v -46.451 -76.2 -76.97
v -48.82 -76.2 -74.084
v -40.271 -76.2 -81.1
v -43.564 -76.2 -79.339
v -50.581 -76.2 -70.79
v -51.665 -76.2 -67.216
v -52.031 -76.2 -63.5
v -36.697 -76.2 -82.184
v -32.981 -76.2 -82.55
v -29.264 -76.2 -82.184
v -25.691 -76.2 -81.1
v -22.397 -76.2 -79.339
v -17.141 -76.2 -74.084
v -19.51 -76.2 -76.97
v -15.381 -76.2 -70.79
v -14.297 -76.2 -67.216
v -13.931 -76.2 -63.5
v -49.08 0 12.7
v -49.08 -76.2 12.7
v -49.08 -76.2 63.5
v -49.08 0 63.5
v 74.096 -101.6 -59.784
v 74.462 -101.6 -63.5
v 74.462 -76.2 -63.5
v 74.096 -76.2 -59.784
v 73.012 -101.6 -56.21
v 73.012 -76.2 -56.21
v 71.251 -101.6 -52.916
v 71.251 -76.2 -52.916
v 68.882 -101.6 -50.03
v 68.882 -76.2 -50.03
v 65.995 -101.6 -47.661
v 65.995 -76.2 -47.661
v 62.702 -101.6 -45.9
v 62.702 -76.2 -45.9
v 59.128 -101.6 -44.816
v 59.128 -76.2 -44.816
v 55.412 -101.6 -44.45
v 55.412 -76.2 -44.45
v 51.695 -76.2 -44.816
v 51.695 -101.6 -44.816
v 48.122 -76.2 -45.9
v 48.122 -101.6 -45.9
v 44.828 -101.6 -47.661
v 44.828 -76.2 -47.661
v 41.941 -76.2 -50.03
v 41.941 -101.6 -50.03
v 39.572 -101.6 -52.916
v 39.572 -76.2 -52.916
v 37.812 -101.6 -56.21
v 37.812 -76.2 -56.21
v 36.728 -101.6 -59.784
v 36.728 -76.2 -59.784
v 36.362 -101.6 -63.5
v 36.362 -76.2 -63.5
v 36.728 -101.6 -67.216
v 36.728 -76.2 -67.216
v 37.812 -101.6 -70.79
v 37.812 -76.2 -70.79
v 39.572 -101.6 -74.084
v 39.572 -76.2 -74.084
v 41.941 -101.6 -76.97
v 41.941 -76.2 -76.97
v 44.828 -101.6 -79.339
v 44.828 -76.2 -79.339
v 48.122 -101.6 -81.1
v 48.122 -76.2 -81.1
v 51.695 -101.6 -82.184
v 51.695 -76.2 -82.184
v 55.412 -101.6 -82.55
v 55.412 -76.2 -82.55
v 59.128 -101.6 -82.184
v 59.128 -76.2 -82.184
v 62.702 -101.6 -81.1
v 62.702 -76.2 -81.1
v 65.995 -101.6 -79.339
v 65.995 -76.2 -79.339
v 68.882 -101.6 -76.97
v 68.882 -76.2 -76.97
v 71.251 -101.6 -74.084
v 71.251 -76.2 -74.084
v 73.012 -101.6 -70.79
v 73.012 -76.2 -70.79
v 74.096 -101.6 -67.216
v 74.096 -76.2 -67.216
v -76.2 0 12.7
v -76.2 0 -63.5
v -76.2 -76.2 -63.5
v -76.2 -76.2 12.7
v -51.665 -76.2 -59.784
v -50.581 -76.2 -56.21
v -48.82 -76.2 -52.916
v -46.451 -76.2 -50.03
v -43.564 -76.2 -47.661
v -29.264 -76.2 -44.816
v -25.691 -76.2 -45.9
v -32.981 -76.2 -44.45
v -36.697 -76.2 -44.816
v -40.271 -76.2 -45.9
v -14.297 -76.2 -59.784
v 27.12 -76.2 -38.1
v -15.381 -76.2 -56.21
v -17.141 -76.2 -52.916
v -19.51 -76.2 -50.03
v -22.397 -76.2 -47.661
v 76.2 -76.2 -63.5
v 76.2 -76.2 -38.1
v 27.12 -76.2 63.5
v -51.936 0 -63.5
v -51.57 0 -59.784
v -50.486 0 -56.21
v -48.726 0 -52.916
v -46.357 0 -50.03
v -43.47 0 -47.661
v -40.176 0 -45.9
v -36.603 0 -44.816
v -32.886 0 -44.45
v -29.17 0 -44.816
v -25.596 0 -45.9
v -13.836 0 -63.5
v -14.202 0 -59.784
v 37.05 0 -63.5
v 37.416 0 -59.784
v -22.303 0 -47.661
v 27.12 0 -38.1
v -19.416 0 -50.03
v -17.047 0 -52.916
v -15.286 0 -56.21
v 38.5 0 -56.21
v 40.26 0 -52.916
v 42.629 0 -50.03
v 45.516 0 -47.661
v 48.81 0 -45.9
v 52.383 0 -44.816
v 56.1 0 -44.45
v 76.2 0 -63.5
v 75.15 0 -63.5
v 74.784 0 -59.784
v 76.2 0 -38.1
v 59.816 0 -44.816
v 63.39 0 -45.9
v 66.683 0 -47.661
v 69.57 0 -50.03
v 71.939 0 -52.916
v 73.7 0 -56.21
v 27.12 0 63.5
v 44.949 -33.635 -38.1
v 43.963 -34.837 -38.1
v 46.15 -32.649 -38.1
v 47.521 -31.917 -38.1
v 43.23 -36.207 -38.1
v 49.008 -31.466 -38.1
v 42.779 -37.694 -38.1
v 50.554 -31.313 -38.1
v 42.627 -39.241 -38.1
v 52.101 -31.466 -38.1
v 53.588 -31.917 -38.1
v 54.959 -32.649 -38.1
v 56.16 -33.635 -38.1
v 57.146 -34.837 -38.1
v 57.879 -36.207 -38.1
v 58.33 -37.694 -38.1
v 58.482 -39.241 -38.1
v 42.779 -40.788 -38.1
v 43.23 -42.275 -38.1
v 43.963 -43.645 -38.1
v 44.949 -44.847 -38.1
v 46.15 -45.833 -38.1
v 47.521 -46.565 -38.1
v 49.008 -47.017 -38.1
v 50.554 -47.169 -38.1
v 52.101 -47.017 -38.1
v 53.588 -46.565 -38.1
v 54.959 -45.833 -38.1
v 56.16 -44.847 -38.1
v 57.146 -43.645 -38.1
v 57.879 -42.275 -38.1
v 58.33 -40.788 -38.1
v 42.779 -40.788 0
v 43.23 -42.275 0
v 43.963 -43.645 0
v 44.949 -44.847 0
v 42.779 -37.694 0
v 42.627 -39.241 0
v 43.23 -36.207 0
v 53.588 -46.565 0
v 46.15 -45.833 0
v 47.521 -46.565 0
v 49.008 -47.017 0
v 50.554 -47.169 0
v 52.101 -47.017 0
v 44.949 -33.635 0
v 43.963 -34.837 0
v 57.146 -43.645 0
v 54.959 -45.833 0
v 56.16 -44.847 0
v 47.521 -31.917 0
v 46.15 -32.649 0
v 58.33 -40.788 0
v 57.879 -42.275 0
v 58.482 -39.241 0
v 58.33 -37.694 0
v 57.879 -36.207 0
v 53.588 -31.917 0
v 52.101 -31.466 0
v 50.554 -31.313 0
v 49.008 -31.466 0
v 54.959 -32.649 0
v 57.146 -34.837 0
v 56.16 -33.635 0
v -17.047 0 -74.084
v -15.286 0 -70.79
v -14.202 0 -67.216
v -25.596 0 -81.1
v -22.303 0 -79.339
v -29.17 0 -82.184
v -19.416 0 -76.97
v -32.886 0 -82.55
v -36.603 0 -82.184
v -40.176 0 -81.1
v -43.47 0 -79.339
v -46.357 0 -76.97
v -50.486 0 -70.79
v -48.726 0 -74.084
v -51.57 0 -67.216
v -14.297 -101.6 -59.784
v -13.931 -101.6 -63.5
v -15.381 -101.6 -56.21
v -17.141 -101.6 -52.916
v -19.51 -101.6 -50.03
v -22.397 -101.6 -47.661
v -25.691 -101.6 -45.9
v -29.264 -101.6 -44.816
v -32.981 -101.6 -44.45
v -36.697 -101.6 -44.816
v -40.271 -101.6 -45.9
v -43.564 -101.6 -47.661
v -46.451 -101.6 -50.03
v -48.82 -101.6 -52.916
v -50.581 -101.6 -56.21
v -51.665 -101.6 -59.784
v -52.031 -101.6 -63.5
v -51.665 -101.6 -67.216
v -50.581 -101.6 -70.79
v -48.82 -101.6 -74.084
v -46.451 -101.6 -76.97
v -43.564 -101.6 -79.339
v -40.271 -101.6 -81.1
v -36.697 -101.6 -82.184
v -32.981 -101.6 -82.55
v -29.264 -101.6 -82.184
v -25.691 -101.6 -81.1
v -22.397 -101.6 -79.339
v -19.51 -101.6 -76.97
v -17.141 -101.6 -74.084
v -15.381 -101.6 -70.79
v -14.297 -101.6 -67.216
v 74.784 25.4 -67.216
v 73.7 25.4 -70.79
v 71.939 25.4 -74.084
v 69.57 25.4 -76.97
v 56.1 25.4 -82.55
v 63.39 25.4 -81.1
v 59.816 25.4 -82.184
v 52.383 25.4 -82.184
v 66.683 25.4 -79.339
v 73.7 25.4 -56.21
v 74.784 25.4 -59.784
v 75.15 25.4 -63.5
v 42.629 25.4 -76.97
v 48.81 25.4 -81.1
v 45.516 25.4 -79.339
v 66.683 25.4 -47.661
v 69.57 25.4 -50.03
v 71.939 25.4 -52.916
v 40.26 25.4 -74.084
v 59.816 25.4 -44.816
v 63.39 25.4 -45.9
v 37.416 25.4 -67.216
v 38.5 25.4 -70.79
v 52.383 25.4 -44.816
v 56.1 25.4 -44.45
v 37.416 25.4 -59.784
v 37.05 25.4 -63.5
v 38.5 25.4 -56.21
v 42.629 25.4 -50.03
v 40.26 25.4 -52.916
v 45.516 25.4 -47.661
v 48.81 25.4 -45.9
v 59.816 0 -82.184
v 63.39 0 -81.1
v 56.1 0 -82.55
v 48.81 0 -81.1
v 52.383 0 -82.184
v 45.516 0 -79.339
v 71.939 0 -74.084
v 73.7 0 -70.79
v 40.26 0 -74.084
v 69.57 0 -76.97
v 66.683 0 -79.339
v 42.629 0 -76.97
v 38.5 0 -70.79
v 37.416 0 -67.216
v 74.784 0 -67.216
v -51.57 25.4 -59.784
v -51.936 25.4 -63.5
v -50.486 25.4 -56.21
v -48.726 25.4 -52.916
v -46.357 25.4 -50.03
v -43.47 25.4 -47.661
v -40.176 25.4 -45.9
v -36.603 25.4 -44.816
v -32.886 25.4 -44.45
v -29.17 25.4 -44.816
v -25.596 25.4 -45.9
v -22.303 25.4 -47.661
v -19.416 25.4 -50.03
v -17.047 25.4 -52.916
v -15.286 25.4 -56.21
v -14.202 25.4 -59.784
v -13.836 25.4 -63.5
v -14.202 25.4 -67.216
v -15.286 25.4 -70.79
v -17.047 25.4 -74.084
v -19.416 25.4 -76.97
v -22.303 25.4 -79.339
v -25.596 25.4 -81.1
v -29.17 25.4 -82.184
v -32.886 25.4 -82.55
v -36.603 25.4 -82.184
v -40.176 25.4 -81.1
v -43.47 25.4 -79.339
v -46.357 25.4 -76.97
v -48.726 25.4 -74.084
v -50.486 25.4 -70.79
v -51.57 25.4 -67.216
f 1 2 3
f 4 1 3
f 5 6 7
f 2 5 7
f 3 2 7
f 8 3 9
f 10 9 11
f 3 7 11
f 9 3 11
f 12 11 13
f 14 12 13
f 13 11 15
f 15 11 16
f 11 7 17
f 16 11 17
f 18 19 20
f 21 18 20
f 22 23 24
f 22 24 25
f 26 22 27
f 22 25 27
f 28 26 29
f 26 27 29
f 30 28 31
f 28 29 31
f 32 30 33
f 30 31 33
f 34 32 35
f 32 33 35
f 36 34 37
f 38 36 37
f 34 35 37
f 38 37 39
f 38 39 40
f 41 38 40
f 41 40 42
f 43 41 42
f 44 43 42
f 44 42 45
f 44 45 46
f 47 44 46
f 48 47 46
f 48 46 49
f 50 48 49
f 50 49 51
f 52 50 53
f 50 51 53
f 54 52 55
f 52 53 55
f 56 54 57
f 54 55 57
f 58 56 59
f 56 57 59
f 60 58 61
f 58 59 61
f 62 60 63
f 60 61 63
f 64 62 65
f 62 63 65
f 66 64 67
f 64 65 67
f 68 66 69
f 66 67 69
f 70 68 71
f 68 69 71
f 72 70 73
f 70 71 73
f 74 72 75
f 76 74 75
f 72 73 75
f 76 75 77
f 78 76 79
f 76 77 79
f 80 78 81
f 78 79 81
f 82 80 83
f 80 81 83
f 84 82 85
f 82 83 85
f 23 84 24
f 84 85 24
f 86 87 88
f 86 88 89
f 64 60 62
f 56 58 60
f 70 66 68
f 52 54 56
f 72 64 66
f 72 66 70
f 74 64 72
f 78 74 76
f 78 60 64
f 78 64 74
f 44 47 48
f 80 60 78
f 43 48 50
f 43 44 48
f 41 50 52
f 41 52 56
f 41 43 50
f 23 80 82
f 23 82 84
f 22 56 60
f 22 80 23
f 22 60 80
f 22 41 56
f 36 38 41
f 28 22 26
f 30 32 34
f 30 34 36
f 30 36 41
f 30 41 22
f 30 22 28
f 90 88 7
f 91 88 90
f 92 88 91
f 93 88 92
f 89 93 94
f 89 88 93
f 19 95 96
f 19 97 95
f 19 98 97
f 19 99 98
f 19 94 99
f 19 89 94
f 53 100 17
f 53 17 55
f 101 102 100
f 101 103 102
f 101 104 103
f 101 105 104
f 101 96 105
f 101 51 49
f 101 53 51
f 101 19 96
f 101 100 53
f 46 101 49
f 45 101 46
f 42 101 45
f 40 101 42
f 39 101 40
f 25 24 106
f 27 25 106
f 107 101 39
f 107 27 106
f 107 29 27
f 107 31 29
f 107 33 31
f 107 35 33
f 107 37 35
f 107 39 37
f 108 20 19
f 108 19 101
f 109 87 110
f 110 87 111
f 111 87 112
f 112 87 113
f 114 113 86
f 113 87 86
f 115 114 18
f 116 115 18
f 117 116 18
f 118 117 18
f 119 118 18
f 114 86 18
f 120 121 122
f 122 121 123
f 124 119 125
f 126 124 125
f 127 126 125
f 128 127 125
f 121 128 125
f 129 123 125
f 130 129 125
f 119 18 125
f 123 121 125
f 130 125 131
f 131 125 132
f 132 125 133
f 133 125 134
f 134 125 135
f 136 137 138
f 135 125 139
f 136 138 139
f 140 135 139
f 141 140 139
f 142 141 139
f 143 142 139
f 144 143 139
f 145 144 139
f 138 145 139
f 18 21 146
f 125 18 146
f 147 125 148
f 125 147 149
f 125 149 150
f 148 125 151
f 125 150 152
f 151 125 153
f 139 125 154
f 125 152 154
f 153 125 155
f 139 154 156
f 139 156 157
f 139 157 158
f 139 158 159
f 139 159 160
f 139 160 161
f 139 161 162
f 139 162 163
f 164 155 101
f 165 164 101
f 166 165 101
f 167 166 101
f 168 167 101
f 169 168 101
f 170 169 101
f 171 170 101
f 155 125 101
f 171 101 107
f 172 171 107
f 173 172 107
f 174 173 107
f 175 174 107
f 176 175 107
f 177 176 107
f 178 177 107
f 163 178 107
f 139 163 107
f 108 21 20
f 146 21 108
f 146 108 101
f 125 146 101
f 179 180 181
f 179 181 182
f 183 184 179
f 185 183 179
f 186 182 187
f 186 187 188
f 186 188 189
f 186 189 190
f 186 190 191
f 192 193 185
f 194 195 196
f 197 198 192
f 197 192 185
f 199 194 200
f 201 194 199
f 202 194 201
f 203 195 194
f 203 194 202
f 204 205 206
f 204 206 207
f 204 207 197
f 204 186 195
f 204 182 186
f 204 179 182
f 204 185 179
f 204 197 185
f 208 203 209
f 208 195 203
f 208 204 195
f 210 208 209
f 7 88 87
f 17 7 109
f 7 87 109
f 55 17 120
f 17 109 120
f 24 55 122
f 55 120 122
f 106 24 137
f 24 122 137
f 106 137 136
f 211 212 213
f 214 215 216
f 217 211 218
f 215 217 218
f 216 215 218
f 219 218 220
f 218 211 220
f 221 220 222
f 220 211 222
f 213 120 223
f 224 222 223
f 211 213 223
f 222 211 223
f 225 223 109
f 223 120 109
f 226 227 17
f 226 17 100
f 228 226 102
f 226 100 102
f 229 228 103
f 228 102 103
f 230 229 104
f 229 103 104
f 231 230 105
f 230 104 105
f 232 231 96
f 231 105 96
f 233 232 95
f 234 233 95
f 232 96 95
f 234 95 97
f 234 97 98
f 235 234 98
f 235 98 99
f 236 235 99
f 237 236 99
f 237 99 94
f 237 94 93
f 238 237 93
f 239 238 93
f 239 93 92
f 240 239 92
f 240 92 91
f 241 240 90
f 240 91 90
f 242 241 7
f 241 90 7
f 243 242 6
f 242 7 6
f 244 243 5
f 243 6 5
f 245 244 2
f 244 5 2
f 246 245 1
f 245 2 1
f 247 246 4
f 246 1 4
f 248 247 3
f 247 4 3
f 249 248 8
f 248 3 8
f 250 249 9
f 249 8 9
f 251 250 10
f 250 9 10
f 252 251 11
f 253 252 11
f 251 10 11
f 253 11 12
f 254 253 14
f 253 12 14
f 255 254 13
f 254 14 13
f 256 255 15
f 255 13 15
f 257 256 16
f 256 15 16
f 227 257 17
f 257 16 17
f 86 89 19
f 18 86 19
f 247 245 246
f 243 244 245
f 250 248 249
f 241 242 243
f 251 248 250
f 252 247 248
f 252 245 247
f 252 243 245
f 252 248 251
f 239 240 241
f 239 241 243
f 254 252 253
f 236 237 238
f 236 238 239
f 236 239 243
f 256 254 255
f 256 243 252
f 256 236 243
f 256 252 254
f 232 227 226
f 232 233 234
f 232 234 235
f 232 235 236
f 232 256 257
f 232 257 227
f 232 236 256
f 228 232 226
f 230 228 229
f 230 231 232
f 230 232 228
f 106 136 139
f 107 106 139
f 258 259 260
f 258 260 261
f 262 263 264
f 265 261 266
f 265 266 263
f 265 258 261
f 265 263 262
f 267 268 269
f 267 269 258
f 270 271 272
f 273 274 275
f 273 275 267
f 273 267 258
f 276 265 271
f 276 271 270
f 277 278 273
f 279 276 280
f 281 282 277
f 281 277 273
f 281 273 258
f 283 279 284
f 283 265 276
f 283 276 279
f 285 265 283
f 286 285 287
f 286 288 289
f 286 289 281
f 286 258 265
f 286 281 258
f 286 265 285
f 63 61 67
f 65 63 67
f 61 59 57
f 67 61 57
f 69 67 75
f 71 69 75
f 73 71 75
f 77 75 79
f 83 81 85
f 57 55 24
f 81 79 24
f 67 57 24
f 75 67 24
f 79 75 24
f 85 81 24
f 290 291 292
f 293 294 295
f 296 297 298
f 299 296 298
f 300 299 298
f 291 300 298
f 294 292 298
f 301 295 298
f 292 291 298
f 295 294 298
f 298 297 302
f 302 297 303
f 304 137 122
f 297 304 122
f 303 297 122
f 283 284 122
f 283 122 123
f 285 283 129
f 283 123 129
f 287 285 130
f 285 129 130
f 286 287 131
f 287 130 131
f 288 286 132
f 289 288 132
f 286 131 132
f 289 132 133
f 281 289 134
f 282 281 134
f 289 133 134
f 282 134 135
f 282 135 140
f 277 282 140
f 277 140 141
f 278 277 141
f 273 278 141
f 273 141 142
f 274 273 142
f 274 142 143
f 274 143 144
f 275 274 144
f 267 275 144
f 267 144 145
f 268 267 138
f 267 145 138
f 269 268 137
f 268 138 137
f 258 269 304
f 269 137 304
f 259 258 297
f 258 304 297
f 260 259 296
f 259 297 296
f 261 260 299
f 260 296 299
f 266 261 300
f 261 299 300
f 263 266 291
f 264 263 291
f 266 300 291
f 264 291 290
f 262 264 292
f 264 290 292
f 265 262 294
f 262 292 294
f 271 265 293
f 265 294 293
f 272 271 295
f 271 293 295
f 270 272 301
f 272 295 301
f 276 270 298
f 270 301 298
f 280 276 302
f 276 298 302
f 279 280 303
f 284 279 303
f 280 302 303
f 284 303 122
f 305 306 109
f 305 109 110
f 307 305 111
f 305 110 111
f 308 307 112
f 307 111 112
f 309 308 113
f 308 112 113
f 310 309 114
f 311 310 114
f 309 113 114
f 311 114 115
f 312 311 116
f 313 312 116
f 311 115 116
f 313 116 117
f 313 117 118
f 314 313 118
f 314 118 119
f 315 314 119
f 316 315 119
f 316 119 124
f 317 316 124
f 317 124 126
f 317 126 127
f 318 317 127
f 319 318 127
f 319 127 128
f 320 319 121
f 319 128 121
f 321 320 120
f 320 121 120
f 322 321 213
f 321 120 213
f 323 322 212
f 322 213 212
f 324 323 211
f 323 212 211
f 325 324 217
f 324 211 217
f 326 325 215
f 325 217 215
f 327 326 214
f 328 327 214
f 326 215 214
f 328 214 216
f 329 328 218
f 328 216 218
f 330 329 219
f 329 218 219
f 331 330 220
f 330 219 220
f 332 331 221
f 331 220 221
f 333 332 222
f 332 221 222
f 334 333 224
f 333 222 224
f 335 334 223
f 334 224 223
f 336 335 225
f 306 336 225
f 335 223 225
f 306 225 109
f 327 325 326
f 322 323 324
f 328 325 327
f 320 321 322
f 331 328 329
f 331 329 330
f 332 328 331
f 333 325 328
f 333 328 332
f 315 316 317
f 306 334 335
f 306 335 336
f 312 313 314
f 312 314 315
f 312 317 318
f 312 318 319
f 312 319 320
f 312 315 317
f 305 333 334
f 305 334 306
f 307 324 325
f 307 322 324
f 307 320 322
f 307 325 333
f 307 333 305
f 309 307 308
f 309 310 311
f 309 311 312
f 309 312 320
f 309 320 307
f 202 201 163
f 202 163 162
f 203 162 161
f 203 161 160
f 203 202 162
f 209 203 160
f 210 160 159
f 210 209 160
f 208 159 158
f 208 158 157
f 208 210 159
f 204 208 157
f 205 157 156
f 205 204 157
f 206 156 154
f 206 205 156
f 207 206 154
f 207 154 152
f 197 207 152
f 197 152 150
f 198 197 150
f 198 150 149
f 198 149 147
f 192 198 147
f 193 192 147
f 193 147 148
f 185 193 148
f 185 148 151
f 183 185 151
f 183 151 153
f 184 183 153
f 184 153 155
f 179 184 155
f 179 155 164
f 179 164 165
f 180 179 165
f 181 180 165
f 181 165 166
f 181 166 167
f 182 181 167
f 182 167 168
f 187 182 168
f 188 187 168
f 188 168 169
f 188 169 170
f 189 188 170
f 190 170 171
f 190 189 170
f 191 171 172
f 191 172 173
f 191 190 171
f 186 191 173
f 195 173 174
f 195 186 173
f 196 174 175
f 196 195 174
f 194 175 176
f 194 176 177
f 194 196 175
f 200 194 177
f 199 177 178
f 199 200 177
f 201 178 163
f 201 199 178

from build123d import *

# Parameters (mm, degrees)
F0_W      = 152.4
F0_H      = 127
F1_DEPTH  = 76.2
F2_W      = 27.119612
F2_H      = 50.8
F3_DEPTH  = 76.201
F4_R      = 19.05
F5_DEPTH  = 25.4
F7_DEPTH  = 25.4
F3_FACE_W = 16.120646
F3_FACE_H = 76.2
F9_DEPTH  = 38.1
F8_R      = 7.927826
F10_DEPTH = 40.64


with BuildPart() as f1:
    # F0 (on Front) → F1 (new body)
    with BuildSketch(Plane.XZ):
        Rectangle(F0_W, F0_H)
    extrude(amount=F1_DEPTH)

    # F2 (on face) → F3 (cut, through all)
    with BuildSketch(Plane.XZ.offset(76.2)):
        with Locations((-62.640194, 38.1)):
            Rectangle(F2_W, F2_H)
        Polygon((76.2, 63.5), (27.119612, 63.5), (27.119612, -38.1), (42.236097, -38.1), (42.236097, 0), (58.356743, 0), (58.356743, -38.1), (76.2, -38.1), align=None)
    extrude(amount=-F3_DEPTH, mode=Mode.SUBTRACT)

    # F4 (on face) → F5 (join)
    with BuildSketch(Plane.XZ.offset(76.2)):
        with Locations((-32.980844, -63.5)):
            Circle(F4_R)
        with Locations((55.411834, -63.5)):
            Circle(F4_R)
    extrude(amount=F5_DEPTH)

    # F6 (on face) → F7 (join)
    with BuildSketch(Plane(origin=(0, 0, 0), x_dir=(-1, 0, 0), z_dir=(0, 1, 0))):
        with BuildLine():
            Line((51.936118, -63.5), (13.836118, -63.5))
            ThreePointArc((13.836118, -63.5), (32.886118, -82.55), (51.936118, -63.5))
        make_face()
        with BuildLine():
            ThreePointArc((-75.149854, -63.5), (-56.099854, -82.55), (-37.049854, -63.5))
            Line((-37.049854, -63.5), (-75.149854, -63.5))
        make_face()
        with BuildLine():
            ThreePointArc((51.936118, -63.5), (32.886118, -44.45), (13.836118, -63.5))
            Line((13.836118, -63.5), (51.936118, -63.5))
        make_face()
        with BuildLine():
            Line((-75.149854, -63.5), (-37.049854, -63.5))
            ThreePointArc((-37.049854, -63.5), (-56.099854, -44.45), (-75.149854, -63.5))
        make_face()
    extrude(amount=F7_DEPTH)

    # F3_face (on face) → F9 (cut)
    with BuildSketch(Plane(origin=(50.29642, -38.1, 0), x_dir=(1, 0, 0), z_dir=(0, 0, 1))):
        Rectangle(F3_FACE_W, F3_FACE_H)
    extrude(amount=-F9_DEPTH, mode=Mode.SUBTRACT)

    # F8 (on Top) → F10 (join)
    with BuildSketch(Plane.XY):
        with Locations((50.55435, -39.241035)):
            Circle(F8_R)
    extrude(amount=-F10_DEPTH)


solid = f1.part
